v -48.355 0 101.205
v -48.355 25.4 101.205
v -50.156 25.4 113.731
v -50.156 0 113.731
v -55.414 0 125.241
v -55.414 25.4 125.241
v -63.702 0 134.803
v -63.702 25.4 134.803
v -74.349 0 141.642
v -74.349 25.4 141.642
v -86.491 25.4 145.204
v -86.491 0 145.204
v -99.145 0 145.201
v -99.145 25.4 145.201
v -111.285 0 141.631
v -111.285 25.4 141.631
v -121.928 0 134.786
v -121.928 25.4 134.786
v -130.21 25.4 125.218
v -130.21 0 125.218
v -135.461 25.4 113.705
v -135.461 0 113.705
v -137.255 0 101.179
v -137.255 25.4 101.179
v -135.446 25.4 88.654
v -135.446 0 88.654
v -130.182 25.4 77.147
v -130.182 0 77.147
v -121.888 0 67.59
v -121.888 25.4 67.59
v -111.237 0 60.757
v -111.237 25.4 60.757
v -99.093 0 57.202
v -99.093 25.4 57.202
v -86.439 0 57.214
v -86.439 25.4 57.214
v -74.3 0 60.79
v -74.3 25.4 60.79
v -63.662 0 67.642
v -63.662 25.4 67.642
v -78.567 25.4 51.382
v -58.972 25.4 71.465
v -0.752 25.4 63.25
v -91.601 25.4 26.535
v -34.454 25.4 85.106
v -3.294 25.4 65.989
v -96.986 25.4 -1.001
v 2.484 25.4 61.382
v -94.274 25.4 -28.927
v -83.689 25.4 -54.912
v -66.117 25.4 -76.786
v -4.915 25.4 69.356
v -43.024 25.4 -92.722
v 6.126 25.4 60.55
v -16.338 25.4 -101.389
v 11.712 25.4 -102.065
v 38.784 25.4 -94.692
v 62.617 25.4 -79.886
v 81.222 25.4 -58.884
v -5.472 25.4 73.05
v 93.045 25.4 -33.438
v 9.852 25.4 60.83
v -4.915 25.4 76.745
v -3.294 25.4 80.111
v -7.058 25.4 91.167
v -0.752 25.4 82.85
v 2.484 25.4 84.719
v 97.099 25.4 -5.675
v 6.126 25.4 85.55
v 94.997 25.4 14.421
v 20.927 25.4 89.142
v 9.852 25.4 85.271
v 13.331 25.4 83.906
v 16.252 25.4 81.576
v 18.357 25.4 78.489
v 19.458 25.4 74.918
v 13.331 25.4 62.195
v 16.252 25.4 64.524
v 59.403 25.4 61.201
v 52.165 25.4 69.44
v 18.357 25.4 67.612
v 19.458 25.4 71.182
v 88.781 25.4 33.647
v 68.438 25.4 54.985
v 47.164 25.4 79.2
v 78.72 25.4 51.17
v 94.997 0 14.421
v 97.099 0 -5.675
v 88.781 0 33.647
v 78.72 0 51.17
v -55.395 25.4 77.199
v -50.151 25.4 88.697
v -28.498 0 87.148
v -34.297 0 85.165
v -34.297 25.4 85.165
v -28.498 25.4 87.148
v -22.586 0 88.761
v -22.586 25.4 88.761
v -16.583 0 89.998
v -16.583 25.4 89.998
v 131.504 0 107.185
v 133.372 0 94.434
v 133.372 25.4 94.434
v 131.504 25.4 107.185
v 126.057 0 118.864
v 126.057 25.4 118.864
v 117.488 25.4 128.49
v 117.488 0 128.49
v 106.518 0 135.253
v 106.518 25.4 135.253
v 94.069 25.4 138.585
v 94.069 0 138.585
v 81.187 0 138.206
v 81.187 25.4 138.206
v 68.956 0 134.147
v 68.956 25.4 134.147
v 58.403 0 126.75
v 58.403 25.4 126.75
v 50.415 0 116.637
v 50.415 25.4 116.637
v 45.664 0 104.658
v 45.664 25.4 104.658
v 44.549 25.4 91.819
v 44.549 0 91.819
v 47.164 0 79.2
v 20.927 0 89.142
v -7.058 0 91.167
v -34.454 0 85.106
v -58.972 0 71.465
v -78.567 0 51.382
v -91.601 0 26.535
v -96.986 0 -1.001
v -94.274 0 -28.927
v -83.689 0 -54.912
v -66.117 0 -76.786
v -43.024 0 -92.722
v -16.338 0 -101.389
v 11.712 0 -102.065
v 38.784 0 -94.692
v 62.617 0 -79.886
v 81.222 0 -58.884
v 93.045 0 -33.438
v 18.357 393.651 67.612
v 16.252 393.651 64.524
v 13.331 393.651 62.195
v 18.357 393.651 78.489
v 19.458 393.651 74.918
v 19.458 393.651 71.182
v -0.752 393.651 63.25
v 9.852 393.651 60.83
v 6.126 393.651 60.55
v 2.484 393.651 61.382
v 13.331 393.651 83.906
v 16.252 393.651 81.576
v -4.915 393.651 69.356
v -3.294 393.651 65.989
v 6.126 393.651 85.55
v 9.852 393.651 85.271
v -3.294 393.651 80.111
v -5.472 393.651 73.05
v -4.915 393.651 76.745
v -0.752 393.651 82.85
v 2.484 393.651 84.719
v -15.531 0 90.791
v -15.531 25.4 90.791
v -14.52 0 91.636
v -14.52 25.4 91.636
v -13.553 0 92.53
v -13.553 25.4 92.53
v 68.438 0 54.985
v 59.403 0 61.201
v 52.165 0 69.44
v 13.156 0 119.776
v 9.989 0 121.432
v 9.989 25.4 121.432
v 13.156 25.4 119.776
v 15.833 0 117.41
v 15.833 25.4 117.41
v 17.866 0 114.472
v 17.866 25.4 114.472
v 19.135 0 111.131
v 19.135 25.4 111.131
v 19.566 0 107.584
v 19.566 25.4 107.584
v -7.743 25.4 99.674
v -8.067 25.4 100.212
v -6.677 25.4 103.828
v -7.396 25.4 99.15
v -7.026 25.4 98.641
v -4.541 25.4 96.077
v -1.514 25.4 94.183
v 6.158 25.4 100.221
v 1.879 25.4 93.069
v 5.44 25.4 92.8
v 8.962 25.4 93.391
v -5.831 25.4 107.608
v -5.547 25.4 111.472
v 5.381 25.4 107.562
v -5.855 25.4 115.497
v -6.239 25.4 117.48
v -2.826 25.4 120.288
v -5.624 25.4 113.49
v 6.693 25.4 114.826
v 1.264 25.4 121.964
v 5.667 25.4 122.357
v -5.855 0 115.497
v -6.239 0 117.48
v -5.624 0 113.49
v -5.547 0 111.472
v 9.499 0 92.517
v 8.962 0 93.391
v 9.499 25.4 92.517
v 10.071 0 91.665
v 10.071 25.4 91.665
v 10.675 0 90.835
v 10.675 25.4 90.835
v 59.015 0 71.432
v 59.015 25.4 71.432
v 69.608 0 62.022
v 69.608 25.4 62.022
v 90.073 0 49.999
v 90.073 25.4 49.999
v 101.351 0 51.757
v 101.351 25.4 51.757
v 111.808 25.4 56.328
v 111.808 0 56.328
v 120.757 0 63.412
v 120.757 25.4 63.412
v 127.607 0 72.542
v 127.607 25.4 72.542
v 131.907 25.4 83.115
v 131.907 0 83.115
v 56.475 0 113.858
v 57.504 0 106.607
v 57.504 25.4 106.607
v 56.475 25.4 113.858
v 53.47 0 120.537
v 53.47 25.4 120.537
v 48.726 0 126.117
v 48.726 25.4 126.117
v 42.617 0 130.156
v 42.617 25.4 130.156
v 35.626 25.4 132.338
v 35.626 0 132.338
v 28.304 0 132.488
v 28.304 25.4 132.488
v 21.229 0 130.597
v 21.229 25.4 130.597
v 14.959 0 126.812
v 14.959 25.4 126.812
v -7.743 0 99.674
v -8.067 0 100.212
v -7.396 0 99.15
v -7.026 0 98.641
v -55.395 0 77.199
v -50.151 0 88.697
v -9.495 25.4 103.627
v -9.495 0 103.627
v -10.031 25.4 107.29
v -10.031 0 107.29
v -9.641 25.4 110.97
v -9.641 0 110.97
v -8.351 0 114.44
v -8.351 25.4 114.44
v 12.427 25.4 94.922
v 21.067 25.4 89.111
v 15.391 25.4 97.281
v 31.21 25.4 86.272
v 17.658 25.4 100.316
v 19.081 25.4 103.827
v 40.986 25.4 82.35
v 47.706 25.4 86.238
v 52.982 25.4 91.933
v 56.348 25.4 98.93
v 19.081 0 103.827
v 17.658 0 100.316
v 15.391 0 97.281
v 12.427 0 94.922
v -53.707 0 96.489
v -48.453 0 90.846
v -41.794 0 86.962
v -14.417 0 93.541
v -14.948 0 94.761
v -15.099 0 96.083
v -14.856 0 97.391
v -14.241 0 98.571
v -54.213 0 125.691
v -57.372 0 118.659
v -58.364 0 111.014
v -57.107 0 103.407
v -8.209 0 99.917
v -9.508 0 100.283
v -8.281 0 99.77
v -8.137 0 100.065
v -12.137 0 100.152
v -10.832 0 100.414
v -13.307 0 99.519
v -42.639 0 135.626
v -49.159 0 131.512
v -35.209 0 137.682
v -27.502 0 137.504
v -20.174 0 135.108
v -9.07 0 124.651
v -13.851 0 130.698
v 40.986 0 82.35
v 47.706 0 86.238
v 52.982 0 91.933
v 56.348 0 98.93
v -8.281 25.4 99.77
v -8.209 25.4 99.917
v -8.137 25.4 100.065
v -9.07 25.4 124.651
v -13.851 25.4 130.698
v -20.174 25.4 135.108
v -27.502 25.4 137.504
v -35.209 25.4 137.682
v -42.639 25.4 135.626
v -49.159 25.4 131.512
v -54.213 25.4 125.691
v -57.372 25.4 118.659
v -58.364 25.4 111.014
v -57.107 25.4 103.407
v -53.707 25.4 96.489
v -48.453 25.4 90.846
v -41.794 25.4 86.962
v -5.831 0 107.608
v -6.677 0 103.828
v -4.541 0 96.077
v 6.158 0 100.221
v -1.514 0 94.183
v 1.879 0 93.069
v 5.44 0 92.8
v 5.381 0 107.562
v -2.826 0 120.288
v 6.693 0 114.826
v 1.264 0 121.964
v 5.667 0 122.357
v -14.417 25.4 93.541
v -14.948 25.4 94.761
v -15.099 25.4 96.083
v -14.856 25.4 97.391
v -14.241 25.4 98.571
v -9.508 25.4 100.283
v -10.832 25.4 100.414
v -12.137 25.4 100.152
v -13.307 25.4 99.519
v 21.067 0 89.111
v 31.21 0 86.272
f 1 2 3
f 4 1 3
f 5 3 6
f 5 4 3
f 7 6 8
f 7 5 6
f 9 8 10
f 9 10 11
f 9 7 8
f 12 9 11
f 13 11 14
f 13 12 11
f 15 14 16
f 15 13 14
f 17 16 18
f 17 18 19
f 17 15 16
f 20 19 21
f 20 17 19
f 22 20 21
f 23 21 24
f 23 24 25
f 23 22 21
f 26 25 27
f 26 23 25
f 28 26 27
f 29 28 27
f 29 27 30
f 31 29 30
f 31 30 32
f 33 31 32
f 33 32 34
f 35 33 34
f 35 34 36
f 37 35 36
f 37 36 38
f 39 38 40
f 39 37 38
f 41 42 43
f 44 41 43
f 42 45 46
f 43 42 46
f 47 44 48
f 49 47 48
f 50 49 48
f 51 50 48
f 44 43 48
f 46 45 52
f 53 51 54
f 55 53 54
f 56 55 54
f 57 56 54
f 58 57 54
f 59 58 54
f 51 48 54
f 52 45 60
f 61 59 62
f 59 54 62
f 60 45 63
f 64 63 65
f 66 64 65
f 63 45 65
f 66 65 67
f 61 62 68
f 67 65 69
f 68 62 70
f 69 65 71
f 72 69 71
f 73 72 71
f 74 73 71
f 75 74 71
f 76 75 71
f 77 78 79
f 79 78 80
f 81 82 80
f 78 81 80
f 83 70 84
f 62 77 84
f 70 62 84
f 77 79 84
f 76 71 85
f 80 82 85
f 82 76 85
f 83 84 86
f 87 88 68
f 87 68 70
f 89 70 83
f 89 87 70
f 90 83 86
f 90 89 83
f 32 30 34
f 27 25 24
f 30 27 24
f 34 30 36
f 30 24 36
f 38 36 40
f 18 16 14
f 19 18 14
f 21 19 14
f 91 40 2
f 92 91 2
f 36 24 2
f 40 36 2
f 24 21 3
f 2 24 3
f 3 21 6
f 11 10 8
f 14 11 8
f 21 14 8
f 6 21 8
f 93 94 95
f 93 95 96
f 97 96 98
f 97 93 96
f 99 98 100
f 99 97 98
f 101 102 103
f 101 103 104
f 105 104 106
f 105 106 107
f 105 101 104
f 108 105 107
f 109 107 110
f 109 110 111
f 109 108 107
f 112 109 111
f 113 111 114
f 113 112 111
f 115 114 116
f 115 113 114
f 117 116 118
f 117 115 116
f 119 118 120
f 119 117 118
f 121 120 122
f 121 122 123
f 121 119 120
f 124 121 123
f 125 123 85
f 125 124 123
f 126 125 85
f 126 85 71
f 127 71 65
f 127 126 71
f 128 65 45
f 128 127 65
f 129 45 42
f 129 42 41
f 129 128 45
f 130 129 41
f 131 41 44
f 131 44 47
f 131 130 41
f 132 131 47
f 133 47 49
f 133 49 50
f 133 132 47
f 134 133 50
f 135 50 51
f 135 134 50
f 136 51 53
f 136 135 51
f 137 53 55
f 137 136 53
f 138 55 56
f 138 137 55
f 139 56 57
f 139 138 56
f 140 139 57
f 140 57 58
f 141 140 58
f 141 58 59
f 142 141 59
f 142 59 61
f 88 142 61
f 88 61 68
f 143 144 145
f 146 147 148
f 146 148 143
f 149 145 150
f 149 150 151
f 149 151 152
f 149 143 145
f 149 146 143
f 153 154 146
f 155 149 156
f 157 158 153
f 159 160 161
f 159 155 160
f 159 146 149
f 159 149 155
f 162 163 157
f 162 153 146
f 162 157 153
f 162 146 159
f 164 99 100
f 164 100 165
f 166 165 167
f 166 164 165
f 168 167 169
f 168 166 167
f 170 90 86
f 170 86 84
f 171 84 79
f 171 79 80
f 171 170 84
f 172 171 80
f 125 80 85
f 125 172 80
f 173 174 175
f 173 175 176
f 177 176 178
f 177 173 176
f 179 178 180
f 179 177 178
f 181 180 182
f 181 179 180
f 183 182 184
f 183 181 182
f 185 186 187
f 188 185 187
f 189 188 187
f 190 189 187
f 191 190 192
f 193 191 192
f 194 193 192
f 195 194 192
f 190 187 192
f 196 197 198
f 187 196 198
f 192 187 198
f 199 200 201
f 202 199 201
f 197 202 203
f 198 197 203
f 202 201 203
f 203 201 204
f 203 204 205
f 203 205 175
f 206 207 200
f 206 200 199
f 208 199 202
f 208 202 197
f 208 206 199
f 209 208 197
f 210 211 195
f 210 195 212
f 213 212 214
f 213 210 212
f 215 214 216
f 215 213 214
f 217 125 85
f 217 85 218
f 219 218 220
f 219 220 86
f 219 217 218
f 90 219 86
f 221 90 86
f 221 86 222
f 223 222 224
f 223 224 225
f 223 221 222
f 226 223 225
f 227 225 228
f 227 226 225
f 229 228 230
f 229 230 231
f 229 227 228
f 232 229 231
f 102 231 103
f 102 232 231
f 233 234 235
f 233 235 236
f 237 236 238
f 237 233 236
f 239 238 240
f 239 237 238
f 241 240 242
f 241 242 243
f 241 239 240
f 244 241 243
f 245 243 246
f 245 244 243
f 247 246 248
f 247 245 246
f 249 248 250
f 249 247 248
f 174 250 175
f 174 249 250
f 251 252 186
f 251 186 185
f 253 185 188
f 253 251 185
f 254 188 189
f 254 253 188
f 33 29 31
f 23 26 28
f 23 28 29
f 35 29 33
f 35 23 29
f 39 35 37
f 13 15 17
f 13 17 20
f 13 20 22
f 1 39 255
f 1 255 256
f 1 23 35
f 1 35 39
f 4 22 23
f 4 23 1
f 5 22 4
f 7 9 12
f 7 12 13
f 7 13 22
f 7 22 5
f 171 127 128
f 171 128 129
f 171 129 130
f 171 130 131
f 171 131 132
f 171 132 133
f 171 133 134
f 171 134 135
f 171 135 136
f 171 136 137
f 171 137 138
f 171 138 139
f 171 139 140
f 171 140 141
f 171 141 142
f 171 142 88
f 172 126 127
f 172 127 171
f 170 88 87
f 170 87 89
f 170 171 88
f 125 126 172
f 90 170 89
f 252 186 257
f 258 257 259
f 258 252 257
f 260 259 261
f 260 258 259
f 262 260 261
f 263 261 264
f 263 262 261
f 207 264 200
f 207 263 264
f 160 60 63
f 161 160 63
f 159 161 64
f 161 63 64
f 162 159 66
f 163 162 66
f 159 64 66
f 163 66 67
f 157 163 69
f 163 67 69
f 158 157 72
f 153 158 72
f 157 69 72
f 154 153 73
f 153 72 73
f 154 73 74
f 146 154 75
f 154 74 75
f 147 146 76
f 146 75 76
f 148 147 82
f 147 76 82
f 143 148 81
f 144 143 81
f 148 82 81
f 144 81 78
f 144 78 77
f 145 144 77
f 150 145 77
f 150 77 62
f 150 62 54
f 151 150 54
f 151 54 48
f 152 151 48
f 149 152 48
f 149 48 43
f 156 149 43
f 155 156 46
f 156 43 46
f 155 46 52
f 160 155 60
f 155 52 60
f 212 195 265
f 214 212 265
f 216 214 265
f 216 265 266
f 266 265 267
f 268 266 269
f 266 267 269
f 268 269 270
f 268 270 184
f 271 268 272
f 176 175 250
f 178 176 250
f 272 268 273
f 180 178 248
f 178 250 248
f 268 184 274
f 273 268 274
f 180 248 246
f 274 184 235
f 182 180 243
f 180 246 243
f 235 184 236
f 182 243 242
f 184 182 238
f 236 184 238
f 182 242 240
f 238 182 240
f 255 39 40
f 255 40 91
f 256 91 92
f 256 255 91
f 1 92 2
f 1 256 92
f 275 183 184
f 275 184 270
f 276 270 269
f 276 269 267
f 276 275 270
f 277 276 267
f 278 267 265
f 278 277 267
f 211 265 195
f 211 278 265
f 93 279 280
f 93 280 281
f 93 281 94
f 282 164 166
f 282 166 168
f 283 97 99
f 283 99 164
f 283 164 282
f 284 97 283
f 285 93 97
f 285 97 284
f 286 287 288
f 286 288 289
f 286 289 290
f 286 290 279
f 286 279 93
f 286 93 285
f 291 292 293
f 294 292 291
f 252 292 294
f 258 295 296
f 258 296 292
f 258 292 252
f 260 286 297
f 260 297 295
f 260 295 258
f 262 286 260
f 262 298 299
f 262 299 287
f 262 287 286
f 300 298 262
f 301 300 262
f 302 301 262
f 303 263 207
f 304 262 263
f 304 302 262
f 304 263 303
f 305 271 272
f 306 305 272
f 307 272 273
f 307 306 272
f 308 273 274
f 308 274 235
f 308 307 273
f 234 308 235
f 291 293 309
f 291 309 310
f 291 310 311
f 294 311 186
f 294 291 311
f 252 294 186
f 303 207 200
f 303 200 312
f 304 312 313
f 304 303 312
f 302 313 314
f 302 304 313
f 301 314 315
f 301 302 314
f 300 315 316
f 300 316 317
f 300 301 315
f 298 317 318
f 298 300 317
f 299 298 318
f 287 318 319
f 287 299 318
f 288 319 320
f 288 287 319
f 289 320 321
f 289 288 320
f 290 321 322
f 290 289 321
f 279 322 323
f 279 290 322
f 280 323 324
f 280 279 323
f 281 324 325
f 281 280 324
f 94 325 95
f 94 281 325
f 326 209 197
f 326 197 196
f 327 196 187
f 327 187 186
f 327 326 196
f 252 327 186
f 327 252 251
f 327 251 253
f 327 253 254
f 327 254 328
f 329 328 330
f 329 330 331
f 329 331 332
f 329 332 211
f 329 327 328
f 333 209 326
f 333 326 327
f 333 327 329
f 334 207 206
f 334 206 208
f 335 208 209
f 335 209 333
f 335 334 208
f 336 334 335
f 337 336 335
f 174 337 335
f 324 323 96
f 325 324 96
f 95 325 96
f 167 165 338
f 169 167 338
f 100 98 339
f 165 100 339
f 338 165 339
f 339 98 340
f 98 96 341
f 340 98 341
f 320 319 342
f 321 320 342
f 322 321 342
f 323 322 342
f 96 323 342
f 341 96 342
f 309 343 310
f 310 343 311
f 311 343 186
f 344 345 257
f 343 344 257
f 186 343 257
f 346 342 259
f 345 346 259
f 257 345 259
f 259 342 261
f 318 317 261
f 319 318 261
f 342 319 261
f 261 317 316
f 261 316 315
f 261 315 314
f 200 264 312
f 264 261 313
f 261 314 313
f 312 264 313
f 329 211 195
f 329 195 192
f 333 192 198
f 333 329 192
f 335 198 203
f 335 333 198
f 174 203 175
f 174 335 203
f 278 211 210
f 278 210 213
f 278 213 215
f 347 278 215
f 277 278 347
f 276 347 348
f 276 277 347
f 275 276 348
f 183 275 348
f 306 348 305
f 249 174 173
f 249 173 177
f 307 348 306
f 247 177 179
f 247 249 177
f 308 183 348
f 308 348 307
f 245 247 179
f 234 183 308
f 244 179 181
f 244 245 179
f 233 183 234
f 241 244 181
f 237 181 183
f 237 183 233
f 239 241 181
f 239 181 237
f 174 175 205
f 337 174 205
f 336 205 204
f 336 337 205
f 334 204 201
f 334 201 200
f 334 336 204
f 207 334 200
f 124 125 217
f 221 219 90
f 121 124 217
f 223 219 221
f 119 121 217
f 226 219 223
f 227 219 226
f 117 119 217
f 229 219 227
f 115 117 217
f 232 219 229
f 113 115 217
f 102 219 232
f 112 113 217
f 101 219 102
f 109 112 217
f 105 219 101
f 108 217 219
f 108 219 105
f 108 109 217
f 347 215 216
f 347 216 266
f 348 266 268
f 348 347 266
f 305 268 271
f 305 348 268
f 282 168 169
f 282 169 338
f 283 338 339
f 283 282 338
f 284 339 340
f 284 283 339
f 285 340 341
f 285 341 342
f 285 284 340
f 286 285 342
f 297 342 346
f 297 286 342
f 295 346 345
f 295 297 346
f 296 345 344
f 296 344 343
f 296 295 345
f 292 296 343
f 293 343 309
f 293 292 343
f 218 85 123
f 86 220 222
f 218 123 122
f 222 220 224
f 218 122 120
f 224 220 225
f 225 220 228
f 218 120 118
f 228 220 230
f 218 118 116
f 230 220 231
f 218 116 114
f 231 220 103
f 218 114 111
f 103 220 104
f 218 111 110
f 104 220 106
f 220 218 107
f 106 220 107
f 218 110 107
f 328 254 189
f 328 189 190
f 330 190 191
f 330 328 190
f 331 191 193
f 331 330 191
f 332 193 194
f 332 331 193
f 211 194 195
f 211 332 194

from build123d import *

# Parameters (mm, degrees)
F2_DEPTH = 25.4
F3_R     = 12.5347954463
F4_DEPTH = 368.2506931


# Not quite as in the source:
# - an extrude ends at something that could not be found from the text; its depth is read off the source's solid


with BuildPart() as f2:
    # F1 (on face) → F2 (new body)
    with BuildSketch(Plane.XZ):
        with BuildLine():
            ThreePointArc((8.9615103374, 93.3914722681), (5.3811386715, 107.5617064877), (9.9891173988, 121.4318590159))
            ThreePointArc((9.9891173988, 121.4318590159), (1.2641159909, 121.9639433995), (-6.2393266144, 117.4798479024))
            ThreePointArc((-6.2393266144, 117.4798479024), (-5.7205661899, 114.4957292899), (-5.5468846049, 111.4718392491))
            ThreePointArc((-5.5468846049, 111.4718392491), (-6.1846894375, 105.7027105797), (-8.0672985226, 100.2122257523))
            ThreePointArc((-8.0672985226, 100.2122257523), (-7.5718801063, 99.4100885879), (-7.0263945394, 98.6411224418))
            ThreePointArc((-7.0263945394, 98.6411224418), (0.1488565511, 93.5229275418), (8.9615103374, 93.3914722681))
        make_face()
    extrude(amount=-F2_DEPTH)


with BuildPart() as f2b:
    # F1 (on face) → F2, piece 2 (new body)
    with BuildSketch(Plane.XZ):
        with BuildLine():
            ThreePointArc((-8.0672985226, 100.2122257523), (-9.9517851493, 109.1422866074), (-6.2393266144, 117.4798479024))
            ThreePointArc((-6.2393266144, 117.4798479024), (-51.8998380867, 128.7872680092), (-34.2974279466, 85.1650808261))
            ThreePointArc((-34.2974279466, 85.1650808261), (-25.5546829871, 88.0009981982), (-16.5829647685, 89.9975674992))
            ThreePointArc((-16.5829647685, 89.9975674992), (-15.0203225596, 91.2072718845), (-13.5525071705, 92.5304322511))
            ThreePointArc((-13.5525071705, 92.5304322511), (-14.2405775832, 98.5709102582), (-8.2805496008, 99.7704442906))
            ThreePointArc((-8.2805496008, 99.7704442906), (-8.1728983191, 99.9908398881), (-8.0672985226, 100.2122257523))
        make_face()
    extrude(amount=-F2_DEPTH)


with BuildPart() as f2c:
    # F1 (on face) → F2, piece 3 (new body)
    with BuildSketch(Plane.XZ):
        with BuildLine():
            ThreePointArc((9.9891173988, 121.4318590159), (16.9384458795, 116.0025356672), (19.5658465826, 107.5842529502))
            ThreePointArc((19.5658465826, 107.5842529502), (16.6219789041, 98.7258251736), (8.9615103374, 93.3914722681))
            ThreePointArc((8.9615103374, 93.3914722681), (9.7806833027, 92.088163609), (10.6753514703, 90.8354758274))
            ThreePointArc((10.6753514703, 90.8354758274), (26.1768230416, 87.8290553094), (40.9860344784, 82.3498727218))
            ThreePointArc((40.9860344784, 82.3498727218), (52.9823213515, 91.9334549759), (57.5038948022, 106.6069453955))
            ThreePointArc((57.5038948022, 106.6069453955), (39.1986453542, 131.493850263), (9.9891173988, 121.4318590159))
        make_face()
    extrude(amount=-F2_DEPTH)


with BuildPart() as f2d:
    # F0 (on Front) → F2, piece 4 (new body)
    with BuildSketch(Plane.XZ):
        with BuildLine():
            ThreePointArc((-48.3549493189, 101.2052206791), (-133.2475901104, 119.6496048056), (-63.6618247207, 67.6421339817))
            ThreePointArc((-63.6618247207, 67.6421339817), (-52.3623085273, 82.7608365526), (-48.3549493189, 101.2052206791))
        make_face()
    extrude(amount=-F2_DEPTH)


with BuildPart() as f2e:
    # F0 (on Front) → F2, piece 5 (new body)
    with BuildSketch(Plane.XZ):
        with BuildLine():
            ThreePointArc((-63.6618247207, 67.6421339817), (-40.2909122509, -94.019991492), (97.0989918611, -5.674891965))
            ThreePointArc((97.0989918611, -5.674891965), (92.3900481259, 24.1963856734), (78.7199498001, 51.1703692615))
            ThreePointArc((78.7199498001, 51.1703692616), (59.4029165337, 61.2009472273), (47.1640406419, 79.2001190263))
            ThreePointArc((47.1640406419, 79.2001190263), (-10.071791025, 90.9003286974), (-63.6618247207, 67.6421339817))
        make_face()
    extrude(amount=-F2_DEPTH)

    # F3 (on face) → F4 (join, through all)
    with BuildSketch(Plane(origin=(0, 25.4, 0), x_dir=(-1, 0, 0), z_dir=(0, 1, 0))):
        with Locations((-7.0632169954, 73.0502381921)):
            Circle(F3_R)
    extrude(amount=F4_DEPTH)


with BuildPart() as f2f:
    # F0 (on Front) → F2, piece 6 (new body)
    with BuildSketch(Plane.XZ):
        with BuildLine():
            ThreePointArc((47.1640406419, 79.2001190263), (64.4834201975, 66.9205813104), (78.7199498001, 51.1703692615))
            ThreePointArc((78.7199498001, 51.1703692616), (116.5112316164, 59.5819602105), (133.3721522419, 94.4337205573))
            ThreePointArc((133.3721522419, 94.4337205573), (81.1873465112, 138.205575445), (47.1640406419, 79.2001190263))
        make_face()
    extrude(amount=-F2_DEPTH)


solid = Compound([f2.part, f2b.part, f2c.part, f2d.part, f2e.part, f2f.part])
